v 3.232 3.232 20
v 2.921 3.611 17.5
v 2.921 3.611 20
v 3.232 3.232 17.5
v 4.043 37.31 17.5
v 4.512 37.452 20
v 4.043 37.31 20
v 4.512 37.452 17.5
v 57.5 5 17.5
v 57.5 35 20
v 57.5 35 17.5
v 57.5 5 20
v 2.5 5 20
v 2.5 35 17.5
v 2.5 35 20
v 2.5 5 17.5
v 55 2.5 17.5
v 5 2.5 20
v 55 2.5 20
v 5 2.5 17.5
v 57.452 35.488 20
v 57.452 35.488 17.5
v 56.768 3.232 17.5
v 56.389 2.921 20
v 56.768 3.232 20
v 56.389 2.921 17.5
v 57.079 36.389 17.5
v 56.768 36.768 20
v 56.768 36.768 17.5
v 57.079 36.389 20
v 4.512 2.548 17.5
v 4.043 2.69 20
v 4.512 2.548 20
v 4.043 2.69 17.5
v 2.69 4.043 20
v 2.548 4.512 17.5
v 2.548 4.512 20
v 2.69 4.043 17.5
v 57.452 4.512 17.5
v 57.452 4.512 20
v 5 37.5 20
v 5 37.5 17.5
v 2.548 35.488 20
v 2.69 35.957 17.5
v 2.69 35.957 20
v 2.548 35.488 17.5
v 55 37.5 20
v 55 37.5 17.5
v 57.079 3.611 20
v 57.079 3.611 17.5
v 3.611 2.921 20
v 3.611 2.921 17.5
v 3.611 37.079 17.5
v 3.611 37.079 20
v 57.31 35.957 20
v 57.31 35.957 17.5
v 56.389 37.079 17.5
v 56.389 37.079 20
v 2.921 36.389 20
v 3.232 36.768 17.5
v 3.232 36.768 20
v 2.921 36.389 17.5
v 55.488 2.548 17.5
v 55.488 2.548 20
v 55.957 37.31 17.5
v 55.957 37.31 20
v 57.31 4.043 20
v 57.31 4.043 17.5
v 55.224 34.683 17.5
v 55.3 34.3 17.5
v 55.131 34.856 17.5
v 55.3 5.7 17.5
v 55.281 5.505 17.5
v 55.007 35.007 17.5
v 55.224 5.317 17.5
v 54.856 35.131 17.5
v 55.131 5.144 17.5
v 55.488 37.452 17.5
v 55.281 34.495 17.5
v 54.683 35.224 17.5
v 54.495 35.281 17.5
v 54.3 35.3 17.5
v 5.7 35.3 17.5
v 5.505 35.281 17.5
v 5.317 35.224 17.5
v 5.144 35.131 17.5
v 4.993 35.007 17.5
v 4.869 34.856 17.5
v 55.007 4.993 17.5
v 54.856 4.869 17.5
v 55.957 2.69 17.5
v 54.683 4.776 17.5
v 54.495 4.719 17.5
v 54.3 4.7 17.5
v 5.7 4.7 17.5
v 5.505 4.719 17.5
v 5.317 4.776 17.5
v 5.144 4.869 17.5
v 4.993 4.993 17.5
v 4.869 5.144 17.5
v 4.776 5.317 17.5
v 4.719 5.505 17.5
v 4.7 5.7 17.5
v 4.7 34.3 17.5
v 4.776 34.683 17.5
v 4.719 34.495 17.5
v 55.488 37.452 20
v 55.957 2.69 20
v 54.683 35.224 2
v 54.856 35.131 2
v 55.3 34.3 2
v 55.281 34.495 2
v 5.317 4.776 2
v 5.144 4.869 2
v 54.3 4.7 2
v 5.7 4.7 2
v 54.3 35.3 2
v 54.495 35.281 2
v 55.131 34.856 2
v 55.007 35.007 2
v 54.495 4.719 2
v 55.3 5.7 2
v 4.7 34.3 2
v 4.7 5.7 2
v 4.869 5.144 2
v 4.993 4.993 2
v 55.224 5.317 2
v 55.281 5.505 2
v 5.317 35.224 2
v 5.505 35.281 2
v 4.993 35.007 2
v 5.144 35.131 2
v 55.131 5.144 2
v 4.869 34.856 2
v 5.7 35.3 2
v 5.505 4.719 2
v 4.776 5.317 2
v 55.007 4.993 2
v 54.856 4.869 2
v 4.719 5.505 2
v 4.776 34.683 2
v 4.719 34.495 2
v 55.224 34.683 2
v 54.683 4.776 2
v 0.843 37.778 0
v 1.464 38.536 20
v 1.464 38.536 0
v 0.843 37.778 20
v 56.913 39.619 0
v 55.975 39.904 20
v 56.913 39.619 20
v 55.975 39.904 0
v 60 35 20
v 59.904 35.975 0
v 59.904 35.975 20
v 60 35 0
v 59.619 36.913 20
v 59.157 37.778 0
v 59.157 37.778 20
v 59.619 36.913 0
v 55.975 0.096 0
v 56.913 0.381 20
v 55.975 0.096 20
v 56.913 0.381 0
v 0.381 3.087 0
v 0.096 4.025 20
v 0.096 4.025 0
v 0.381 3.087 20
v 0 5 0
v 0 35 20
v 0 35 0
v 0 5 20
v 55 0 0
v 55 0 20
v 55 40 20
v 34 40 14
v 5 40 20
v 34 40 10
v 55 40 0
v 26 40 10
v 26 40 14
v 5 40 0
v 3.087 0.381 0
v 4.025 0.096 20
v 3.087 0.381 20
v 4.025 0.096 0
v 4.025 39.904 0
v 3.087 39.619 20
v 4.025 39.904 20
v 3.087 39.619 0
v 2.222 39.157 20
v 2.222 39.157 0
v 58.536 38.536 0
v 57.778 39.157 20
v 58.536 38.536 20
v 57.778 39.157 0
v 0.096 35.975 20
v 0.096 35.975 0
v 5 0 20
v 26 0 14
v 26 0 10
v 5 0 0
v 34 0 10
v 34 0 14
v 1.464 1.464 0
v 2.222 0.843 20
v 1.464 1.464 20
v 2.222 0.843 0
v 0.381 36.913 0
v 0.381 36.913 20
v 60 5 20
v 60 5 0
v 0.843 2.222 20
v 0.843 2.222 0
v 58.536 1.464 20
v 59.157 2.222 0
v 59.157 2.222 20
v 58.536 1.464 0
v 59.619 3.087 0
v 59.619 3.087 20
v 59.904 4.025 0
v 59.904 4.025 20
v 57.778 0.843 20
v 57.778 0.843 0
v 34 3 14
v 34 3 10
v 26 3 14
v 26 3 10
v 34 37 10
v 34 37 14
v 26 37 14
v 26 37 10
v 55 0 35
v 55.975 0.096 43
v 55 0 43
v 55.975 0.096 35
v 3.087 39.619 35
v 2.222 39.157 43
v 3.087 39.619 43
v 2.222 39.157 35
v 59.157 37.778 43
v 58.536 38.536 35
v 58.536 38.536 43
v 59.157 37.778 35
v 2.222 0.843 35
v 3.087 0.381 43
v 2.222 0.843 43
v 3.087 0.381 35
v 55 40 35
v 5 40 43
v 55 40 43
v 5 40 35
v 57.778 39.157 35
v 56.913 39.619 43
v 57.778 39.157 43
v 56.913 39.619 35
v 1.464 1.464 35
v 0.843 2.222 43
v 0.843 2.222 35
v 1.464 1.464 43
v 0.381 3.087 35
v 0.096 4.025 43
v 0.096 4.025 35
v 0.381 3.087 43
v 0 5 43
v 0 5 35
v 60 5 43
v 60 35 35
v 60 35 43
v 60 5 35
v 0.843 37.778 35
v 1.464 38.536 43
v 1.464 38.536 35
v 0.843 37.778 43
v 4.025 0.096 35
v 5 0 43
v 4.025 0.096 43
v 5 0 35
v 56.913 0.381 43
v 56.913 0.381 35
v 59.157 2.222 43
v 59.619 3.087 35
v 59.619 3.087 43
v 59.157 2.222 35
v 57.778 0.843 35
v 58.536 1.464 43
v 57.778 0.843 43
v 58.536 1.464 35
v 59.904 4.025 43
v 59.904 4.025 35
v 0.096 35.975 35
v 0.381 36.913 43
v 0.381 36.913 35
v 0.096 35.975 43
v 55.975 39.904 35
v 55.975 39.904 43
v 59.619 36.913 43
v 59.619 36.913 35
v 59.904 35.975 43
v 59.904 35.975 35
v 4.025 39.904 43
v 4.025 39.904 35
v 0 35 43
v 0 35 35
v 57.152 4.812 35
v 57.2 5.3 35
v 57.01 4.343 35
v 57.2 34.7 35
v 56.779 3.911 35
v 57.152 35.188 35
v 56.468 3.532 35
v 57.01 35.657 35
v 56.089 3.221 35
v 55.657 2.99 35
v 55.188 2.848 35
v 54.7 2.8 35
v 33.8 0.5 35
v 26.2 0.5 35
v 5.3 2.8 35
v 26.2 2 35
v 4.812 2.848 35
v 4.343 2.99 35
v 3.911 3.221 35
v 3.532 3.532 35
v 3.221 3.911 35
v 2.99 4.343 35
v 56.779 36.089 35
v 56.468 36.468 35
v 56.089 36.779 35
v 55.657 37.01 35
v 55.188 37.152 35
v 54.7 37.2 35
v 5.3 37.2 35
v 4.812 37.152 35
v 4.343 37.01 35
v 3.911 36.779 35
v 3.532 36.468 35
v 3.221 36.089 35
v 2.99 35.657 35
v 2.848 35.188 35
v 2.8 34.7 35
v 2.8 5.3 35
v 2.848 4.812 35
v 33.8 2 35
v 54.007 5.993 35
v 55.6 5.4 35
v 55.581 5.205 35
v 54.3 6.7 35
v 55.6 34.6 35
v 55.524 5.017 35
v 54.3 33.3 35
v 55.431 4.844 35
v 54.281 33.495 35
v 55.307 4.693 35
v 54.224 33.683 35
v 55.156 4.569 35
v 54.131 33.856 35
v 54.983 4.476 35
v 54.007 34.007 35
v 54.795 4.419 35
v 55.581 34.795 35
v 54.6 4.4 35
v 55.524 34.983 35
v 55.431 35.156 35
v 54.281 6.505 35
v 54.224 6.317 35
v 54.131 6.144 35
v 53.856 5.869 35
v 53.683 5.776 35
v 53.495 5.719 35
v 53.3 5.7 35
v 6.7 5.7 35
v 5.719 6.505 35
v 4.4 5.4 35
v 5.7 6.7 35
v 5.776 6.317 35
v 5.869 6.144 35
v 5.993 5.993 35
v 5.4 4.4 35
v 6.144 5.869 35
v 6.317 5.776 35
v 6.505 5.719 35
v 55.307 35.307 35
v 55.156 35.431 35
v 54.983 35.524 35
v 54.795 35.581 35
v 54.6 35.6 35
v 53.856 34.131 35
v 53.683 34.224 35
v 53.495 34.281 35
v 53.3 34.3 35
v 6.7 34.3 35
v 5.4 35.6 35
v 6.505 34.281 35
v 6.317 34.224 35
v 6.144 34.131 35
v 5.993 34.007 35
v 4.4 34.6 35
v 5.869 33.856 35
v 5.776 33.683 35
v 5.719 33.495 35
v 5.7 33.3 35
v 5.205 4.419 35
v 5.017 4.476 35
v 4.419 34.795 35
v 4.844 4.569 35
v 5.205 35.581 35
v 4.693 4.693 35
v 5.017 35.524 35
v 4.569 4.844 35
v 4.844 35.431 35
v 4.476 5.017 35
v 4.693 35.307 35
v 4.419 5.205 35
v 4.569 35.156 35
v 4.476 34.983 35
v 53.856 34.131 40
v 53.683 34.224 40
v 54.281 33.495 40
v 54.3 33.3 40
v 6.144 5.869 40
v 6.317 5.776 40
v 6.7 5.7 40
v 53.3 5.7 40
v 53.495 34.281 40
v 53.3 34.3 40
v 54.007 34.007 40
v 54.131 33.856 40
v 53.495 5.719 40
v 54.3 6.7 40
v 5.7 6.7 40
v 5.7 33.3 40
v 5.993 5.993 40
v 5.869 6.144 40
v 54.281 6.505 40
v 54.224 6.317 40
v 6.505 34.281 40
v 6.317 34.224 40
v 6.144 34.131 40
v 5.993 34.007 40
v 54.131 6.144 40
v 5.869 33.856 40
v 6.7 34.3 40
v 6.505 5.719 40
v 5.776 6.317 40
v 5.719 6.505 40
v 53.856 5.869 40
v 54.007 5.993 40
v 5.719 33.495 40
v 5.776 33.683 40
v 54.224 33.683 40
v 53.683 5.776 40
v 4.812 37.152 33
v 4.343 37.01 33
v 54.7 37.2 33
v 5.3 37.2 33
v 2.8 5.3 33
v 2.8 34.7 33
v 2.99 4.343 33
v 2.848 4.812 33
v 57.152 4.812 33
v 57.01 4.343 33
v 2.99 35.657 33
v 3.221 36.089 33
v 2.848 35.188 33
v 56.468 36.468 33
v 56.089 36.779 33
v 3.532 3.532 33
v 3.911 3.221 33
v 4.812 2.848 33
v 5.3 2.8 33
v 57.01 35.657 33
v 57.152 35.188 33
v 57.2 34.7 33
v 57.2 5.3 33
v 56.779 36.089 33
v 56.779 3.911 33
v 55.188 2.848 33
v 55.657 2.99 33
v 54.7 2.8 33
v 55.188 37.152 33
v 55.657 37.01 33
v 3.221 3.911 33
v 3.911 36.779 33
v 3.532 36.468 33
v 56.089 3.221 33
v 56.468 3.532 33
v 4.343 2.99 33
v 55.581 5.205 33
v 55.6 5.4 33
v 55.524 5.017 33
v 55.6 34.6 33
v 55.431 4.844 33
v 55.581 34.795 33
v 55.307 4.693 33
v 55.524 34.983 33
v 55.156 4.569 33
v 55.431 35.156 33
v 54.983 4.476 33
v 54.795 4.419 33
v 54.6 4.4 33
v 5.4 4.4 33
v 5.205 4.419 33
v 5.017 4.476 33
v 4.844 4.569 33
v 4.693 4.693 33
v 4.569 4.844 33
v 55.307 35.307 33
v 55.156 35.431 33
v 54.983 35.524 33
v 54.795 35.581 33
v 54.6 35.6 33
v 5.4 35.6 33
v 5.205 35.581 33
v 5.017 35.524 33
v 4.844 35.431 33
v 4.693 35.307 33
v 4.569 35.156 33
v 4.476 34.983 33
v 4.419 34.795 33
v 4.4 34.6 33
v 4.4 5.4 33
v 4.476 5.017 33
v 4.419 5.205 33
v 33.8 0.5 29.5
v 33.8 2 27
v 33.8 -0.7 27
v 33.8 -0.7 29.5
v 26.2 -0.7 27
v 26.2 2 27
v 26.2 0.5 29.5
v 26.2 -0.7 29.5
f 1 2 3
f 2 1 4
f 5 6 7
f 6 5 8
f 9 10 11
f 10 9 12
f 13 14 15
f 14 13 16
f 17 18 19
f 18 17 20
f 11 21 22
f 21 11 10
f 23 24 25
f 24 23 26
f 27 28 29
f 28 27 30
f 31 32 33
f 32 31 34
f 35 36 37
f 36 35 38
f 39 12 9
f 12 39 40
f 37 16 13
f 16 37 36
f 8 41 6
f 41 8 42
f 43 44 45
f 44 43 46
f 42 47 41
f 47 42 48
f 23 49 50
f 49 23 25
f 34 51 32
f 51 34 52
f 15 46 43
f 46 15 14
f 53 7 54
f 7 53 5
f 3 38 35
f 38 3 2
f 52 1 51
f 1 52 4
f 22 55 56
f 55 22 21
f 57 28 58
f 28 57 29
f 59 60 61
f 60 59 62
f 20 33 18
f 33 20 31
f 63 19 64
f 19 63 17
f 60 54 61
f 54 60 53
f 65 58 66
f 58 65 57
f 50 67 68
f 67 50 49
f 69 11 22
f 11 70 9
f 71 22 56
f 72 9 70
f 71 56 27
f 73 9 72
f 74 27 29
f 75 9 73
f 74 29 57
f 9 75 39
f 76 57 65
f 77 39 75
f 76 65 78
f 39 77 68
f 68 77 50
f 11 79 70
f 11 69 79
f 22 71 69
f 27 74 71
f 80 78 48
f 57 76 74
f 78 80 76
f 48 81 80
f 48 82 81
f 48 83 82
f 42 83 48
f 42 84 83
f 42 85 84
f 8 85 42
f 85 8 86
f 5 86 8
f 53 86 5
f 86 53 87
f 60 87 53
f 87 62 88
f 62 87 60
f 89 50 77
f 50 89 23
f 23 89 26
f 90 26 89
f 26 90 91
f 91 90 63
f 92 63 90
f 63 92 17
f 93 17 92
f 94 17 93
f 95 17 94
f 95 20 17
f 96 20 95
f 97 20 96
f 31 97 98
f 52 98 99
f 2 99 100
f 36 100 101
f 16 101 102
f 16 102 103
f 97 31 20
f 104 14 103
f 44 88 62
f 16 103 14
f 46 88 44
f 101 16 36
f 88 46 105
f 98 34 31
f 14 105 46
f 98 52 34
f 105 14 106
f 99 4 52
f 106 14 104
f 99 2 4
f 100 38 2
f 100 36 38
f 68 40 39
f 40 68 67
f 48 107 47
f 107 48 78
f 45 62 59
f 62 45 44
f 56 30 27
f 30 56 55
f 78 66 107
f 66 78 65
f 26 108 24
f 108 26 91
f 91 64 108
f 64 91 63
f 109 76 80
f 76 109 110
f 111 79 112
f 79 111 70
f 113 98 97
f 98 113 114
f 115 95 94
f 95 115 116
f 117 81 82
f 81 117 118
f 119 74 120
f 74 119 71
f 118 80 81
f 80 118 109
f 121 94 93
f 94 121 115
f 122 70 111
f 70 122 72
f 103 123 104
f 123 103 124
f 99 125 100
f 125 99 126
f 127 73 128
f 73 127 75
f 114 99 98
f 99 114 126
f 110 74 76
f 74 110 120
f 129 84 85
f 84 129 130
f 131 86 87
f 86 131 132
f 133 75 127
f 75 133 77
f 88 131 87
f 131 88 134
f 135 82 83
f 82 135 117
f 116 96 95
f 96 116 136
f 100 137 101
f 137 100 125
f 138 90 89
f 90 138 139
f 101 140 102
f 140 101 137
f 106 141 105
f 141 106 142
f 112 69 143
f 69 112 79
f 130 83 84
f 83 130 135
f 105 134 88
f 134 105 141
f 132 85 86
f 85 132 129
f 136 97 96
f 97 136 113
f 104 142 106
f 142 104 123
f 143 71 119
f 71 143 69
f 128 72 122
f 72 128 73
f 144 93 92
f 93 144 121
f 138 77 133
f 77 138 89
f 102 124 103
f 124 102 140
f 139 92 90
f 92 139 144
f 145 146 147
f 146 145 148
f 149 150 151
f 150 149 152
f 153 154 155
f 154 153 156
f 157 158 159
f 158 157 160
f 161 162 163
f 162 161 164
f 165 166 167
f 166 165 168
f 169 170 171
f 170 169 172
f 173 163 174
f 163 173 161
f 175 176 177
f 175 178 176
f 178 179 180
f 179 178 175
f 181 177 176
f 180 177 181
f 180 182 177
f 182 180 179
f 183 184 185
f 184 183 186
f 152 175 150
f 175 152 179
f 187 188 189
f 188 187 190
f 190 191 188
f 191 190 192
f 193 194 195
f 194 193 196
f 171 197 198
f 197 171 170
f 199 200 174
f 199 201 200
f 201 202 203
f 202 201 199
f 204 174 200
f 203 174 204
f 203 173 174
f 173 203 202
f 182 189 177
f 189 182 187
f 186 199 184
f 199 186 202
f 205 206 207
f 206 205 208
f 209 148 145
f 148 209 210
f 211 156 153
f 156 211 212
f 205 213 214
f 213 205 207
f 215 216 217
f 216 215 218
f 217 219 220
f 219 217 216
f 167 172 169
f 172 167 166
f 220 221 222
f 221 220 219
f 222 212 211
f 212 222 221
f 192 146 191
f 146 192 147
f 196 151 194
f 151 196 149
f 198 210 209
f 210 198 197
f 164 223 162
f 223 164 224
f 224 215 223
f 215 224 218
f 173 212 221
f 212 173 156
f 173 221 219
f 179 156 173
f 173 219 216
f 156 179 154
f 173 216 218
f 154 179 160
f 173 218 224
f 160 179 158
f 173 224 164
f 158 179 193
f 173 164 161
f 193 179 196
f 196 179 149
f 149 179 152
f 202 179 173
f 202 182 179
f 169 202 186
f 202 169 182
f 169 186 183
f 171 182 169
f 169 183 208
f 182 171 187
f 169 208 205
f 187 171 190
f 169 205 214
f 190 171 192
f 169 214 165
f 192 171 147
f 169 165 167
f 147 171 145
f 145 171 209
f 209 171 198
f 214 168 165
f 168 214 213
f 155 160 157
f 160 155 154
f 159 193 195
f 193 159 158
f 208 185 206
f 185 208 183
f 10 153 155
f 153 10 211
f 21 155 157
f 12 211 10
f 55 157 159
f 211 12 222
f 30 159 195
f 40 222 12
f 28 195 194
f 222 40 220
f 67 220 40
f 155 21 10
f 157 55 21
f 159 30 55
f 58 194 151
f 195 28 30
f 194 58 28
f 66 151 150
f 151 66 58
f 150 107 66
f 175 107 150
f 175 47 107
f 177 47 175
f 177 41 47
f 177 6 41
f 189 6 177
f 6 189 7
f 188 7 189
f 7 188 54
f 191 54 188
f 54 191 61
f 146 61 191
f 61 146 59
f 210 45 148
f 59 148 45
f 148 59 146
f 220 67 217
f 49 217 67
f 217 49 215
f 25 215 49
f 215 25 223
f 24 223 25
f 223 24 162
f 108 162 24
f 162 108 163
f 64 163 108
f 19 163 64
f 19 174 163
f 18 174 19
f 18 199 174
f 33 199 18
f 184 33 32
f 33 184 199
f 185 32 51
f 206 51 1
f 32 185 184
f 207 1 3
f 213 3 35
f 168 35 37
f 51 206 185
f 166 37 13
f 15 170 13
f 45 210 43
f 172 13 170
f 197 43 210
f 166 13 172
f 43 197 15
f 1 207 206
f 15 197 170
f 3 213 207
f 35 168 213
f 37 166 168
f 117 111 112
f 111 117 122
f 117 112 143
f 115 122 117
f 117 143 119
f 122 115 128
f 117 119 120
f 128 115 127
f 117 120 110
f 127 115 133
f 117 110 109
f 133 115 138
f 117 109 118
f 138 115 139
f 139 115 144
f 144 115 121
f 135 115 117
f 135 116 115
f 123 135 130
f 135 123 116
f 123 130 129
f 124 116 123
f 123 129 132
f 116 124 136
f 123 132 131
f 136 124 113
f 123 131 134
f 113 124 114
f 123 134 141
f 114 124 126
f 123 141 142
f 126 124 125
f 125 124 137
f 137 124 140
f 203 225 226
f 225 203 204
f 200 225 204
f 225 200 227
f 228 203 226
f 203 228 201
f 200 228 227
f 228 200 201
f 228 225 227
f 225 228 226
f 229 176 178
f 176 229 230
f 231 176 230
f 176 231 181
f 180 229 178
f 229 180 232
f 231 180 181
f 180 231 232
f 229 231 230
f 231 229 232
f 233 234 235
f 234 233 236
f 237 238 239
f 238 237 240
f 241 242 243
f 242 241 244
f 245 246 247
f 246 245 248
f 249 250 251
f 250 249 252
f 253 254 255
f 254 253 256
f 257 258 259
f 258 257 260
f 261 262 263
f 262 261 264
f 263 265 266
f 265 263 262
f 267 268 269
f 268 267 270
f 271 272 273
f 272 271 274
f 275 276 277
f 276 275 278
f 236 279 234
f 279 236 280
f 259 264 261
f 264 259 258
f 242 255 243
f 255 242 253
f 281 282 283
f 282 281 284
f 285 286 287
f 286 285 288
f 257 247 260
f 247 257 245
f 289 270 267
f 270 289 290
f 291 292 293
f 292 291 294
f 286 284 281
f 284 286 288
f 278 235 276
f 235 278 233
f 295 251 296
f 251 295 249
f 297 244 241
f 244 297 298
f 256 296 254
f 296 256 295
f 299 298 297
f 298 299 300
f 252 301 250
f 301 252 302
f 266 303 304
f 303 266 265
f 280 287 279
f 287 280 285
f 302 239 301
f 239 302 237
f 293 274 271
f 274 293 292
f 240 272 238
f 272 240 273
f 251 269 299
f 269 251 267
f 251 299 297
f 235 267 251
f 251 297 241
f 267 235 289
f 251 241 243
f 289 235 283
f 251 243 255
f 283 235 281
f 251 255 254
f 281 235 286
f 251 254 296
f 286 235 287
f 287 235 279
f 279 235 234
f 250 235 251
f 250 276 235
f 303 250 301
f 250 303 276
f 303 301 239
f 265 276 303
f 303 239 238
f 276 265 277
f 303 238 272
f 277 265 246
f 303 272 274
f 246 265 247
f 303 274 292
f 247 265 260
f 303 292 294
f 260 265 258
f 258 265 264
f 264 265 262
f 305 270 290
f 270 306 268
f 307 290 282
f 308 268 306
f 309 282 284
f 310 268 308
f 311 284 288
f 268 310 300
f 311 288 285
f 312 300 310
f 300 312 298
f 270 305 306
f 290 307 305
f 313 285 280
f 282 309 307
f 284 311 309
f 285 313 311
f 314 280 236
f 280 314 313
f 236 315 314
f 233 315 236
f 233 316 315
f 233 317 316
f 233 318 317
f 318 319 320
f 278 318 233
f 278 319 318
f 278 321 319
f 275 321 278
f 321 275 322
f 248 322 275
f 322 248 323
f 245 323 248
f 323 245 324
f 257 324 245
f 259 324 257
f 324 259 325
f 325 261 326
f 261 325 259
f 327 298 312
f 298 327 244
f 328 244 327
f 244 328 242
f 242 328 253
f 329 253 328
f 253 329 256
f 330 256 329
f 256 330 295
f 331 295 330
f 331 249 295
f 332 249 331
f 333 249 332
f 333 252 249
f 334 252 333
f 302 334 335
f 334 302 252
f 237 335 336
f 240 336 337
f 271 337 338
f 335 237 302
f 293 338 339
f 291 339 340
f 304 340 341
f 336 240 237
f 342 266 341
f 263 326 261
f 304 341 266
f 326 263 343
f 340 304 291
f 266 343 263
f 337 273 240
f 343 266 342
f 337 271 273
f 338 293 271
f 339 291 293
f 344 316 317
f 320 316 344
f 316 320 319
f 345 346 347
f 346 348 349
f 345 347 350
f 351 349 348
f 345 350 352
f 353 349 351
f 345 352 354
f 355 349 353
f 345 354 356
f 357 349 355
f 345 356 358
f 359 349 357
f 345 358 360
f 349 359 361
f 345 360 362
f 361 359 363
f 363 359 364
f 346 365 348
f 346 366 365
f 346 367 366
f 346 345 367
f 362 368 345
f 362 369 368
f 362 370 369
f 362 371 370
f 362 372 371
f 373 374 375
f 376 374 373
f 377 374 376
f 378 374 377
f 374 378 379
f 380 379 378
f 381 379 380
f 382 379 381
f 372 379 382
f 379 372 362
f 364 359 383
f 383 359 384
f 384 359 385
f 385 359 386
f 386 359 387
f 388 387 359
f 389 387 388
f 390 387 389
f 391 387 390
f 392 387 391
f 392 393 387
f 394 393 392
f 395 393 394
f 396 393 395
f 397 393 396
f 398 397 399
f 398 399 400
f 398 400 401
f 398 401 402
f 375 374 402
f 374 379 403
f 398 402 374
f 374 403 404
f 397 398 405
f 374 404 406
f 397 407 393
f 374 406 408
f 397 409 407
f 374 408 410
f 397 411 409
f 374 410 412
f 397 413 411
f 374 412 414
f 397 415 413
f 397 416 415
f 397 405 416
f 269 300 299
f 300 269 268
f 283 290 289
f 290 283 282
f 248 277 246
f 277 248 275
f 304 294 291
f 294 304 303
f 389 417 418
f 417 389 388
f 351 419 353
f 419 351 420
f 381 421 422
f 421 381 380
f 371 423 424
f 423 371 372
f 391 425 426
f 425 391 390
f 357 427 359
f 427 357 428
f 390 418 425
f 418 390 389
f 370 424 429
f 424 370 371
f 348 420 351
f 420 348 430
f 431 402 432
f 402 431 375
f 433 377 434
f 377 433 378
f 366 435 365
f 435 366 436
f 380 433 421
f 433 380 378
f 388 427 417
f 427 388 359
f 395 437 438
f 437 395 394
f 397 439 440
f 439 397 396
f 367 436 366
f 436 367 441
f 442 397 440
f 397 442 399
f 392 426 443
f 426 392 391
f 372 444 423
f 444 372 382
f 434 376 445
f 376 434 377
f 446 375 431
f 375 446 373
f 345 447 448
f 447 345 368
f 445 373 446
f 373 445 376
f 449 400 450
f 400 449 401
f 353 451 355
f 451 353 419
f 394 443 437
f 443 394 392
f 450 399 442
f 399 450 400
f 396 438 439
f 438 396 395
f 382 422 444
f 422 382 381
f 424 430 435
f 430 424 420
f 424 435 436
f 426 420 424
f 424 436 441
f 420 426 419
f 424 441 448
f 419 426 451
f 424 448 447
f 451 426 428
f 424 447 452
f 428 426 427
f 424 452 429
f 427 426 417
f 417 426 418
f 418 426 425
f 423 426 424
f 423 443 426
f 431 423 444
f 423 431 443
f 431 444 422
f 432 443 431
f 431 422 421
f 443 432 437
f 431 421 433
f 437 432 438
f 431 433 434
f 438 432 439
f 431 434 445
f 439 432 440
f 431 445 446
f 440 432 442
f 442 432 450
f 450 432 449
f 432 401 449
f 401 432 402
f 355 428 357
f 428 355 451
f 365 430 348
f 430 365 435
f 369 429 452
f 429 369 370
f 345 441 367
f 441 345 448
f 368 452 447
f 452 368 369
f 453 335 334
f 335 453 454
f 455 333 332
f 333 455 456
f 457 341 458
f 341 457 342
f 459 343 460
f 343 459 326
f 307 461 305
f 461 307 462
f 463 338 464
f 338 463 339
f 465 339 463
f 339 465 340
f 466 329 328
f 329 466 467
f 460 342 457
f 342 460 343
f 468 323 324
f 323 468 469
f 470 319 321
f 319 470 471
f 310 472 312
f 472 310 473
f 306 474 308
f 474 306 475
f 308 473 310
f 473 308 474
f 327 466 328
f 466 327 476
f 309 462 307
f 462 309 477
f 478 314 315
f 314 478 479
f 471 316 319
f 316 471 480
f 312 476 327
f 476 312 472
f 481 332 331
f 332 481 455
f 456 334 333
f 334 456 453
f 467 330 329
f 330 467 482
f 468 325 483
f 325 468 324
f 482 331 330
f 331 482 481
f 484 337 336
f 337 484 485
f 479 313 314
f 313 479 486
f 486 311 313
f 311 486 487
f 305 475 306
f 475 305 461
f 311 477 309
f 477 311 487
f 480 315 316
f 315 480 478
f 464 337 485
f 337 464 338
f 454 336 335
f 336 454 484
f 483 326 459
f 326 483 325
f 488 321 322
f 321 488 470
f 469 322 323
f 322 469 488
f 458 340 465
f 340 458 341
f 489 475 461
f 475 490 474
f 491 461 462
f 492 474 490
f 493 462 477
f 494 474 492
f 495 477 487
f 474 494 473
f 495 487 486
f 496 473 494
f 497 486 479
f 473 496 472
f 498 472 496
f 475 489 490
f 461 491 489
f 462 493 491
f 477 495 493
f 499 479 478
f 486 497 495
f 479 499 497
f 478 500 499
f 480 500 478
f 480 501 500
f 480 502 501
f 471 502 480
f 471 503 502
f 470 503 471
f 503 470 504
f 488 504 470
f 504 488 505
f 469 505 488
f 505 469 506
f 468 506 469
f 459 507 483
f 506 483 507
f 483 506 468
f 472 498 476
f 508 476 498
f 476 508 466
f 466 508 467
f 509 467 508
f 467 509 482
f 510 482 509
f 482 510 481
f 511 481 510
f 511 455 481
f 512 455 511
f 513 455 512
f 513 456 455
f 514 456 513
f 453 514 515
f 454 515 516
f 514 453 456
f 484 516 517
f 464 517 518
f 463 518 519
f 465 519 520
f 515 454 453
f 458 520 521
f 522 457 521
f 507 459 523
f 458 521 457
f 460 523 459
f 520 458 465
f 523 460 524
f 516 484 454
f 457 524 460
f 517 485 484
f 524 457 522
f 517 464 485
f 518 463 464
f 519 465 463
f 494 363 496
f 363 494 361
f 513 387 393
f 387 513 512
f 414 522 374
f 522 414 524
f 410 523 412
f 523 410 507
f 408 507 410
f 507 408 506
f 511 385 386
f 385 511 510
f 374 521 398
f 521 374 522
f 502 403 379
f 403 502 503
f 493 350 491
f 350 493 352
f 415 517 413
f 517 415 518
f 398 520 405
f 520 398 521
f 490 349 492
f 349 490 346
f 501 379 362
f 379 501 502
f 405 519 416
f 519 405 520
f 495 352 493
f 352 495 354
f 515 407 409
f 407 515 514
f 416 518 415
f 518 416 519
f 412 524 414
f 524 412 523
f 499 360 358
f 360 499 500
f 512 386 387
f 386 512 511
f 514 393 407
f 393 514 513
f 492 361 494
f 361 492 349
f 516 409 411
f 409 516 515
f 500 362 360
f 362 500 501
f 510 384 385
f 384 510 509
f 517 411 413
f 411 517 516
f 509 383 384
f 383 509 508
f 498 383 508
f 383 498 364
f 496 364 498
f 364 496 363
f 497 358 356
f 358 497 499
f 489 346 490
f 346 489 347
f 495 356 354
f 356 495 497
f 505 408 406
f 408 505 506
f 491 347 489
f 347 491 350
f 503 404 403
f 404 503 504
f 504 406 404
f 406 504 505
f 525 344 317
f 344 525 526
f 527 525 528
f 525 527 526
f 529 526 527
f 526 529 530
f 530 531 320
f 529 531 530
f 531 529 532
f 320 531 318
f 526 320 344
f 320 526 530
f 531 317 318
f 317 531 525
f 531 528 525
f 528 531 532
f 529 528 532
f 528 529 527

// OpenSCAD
$fn = 32;

// Parámetros
l = 60;
w = 40;
h_base = 20;
h_lid = 8;
r = 5;
wall = 2.5;

// U-channel parameters
u_w = 2.2;
u_d = 2.5;
tongue_w = 1.6;
tongue_h = 2.0;

// Snap clip parameters
clip_w = 8.0;
clip_t = 1.5;
clip_h = 6.0;
hook_d = 1.2;

module r_box(len, wid, hei, rad) {
    hull() {
        translate([rad, rad, 0]) cylinder(r=rad, h=hei);
        translate([len-rad, rad, 0]) cylinder(r=rad, h=hei);
        translate([rad, wid-rad, 0]) cylinder(r=rad, h=hei);
        translate([len-rad, wid-rad, 0]) cylinder(r=rad, h=hei);
    }
}

// 1. BASE WITH U-CHANNEL AND SNAP SLOTS
module base_test() {
    difference() {
        r_box(l, w, h_base, r);
        // Interior cavity
        translate([wall + u_w, wall + u_w, 2])
            r_box(l - 2*(wall + u_w), w - 2*(wall + u_w), h_base + 2, max(1, r - wall - u_w));
        // Perimeter U-channel
        translate([wall, wall, h_base - u_d]) {
            difference() {
                r_box(l - 2*wall, w - 2*wall, u_d + 1, max(1, r - wall));
                translate([u_w, u_w, -0.5])
                    r_box(l - 2*(wall + u_w), w - 2*(wall + u_w), u_d + 2, max(1, r - wall - u_w));
            }
        }
        // Snap slot side 1
        translate([l/2 - clip_w/2, -0.5, h_base - 10])
            cube([clip_w, wall + 1, 4]);
        // Snap slot side 2
        translate([l/2 - clip_w/2, w - wall - 0.5, h_base - 10])
            cube([clip_w, wall + 1, 4]);
    }
}

// 2. LID WITH TONGUE AND SNAP HOOKS
module lid_test() {
    union() {
        difference() {
            r_box(l, w, h_lid, r);
            translate([wall + u_w + 1, wall + u_w + 1, -1])
                r_box(l - 2*(wall + u_w + 1), w - 2*(wall + u_w + 1), h_lid - 2, max(1, r - wall - u_w - 1));
        }
        // Downward tongue
        translate([wall + (u_w - tongue_w)/2, wall + (u_w - tongue_w)/2, -tongue_h]) {
            difference() {
                r_box(l - 2*(wall + (u_w - tongue_w)/2), w - 2*(wall + (u_w - tongue_w)/2), tongue_h + 0.1, max(1, r - wall));
                translate([tongue_w, tongue_w, -0.5])
                    r_box(l - 2*(wall + (u_w - tongue_w)/2 + tongue_w), w - 2*(wall + (u_w - tongue_w)/2 + tongue_w), tongue_h + 1.2, max(1, r - wall - tongue_w));
            }
        }
        // Snap clip cantilever arm side 1
        translate([l/2 - clip_w/2 + 0.2, 0.5, -8]) {
            cube([clip_w - 0.4, clip_t, 8]);
            translate([0, -hook_d, 0])
                cube([clip_w - 0.4, hook_d, 2.5]);
        }
    }
}

base_test();
translate([0, 0, h_base + 15]) lid_test();
